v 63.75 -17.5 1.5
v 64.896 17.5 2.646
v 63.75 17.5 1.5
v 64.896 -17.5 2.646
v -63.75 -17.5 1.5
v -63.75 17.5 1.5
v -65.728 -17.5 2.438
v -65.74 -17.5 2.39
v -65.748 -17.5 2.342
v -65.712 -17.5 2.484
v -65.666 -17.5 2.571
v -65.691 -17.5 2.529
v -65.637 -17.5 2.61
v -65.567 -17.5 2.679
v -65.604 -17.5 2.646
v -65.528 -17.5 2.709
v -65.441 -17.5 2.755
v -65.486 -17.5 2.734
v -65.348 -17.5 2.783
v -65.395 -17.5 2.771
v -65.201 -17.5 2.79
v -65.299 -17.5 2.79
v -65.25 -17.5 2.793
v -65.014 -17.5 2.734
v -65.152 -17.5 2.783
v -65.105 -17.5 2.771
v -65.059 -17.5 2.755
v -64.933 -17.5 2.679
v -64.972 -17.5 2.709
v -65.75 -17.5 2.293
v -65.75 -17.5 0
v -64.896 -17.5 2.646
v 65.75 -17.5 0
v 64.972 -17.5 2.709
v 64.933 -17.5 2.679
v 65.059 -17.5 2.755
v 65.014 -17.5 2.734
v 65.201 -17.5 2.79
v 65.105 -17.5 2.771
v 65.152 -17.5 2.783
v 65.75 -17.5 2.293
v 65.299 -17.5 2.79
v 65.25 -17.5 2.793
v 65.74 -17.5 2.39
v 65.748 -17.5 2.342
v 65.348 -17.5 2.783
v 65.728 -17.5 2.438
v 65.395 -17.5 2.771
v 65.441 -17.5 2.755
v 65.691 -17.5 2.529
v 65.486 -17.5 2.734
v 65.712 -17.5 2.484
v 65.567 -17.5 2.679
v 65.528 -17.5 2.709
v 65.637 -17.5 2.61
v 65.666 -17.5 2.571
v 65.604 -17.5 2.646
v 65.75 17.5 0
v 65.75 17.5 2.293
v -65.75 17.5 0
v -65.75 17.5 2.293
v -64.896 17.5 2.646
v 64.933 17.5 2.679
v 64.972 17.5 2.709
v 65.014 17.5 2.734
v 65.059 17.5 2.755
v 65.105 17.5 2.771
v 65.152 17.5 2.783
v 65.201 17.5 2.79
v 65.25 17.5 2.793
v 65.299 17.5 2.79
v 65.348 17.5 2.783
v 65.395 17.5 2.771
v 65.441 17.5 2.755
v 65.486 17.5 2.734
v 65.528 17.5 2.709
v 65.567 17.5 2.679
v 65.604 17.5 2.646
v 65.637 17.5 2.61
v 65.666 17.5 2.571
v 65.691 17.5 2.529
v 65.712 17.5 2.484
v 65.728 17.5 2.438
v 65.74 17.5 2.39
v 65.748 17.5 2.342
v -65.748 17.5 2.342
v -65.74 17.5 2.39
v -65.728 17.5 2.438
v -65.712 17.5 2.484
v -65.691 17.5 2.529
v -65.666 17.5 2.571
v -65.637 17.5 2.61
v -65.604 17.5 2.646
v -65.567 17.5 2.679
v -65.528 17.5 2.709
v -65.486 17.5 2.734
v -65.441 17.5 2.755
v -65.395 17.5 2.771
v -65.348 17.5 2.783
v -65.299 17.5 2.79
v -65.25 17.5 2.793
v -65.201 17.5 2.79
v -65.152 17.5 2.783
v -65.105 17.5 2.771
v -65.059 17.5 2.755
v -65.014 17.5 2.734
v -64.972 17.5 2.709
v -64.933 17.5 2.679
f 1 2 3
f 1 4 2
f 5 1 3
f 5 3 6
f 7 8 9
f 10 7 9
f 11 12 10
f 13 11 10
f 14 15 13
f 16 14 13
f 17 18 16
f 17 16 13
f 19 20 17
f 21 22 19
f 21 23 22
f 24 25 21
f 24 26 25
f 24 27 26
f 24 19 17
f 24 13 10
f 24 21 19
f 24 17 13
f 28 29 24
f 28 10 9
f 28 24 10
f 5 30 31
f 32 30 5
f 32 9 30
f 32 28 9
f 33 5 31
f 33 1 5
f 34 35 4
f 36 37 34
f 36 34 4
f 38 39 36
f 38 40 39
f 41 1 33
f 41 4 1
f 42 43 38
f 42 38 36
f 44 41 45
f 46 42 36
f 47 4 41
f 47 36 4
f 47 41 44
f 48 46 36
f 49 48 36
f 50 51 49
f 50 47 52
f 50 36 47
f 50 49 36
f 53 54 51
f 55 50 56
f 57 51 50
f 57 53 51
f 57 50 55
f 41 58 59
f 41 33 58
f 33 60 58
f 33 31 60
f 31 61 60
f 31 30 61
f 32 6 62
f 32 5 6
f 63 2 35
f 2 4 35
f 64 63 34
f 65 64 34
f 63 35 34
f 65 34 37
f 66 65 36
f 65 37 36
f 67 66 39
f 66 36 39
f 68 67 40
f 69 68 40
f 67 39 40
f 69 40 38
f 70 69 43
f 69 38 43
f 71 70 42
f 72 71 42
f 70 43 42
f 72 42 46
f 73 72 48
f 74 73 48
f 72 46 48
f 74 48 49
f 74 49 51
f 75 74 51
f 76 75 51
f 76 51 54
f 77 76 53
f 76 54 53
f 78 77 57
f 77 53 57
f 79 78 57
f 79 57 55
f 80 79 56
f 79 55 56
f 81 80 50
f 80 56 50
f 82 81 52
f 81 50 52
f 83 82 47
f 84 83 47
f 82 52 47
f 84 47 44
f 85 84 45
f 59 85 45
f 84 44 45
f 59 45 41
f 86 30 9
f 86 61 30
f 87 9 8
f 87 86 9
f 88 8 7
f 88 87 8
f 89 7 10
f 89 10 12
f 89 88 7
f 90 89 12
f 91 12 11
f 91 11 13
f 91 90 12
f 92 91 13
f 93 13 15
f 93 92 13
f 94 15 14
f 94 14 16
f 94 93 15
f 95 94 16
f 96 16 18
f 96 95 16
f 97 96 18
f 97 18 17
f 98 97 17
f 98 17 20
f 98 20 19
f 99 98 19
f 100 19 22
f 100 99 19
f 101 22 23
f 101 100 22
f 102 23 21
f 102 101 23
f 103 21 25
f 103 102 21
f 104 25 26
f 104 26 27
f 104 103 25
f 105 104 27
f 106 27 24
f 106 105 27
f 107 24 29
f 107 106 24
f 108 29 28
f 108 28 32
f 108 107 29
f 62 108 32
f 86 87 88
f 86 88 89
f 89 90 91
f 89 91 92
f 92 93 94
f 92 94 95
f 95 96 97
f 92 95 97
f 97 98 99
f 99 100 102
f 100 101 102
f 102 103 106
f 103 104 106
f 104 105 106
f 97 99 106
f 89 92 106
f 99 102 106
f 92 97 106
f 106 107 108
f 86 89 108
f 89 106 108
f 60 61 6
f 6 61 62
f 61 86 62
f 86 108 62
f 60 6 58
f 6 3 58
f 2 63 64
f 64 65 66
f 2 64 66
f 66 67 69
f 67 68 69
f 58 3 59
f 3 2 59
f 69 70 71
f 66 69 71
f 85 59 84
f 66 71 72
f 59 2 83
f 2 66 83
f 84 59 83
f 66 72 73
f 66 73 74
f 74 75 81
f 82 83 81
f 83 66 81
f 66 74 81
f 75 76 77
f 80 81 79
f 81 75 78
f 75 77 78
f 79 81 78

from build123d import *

# Parameters (mm, degrees)
F1_DEPTH = 17.5
F2_R     = 0.5


with BuildPart() as f1:
    # F0 (on Front) → F1 (new body, symmetric)
    with BuildSketch(Plane.XZ):
        Polygon((-65.75, 1.5), (-65.75, 0), (65.75, 0), (65.75, 1.5), (63.75, 1.5), (-63.75, 1.5), align=None)
        Polygon((-65.75, 3.5), (-65.75, 1.5), (-63.75, 1.5), align=None)
        Polygon((63.75, 1.5), (65.75, 1.5), (65.75, 3.5), align=None)
    extrude(amount=F1_DEPTH, both=True)

    # F2
    f2_edges = [f1.edges().sort_by_distance(p)[0] for p in [
        (-65.75, 0, 3.5),
        (65.75, 0, 3.5),
    ]]
    fillet(f2_edges, radius=F2_R)


solid = f1.part
